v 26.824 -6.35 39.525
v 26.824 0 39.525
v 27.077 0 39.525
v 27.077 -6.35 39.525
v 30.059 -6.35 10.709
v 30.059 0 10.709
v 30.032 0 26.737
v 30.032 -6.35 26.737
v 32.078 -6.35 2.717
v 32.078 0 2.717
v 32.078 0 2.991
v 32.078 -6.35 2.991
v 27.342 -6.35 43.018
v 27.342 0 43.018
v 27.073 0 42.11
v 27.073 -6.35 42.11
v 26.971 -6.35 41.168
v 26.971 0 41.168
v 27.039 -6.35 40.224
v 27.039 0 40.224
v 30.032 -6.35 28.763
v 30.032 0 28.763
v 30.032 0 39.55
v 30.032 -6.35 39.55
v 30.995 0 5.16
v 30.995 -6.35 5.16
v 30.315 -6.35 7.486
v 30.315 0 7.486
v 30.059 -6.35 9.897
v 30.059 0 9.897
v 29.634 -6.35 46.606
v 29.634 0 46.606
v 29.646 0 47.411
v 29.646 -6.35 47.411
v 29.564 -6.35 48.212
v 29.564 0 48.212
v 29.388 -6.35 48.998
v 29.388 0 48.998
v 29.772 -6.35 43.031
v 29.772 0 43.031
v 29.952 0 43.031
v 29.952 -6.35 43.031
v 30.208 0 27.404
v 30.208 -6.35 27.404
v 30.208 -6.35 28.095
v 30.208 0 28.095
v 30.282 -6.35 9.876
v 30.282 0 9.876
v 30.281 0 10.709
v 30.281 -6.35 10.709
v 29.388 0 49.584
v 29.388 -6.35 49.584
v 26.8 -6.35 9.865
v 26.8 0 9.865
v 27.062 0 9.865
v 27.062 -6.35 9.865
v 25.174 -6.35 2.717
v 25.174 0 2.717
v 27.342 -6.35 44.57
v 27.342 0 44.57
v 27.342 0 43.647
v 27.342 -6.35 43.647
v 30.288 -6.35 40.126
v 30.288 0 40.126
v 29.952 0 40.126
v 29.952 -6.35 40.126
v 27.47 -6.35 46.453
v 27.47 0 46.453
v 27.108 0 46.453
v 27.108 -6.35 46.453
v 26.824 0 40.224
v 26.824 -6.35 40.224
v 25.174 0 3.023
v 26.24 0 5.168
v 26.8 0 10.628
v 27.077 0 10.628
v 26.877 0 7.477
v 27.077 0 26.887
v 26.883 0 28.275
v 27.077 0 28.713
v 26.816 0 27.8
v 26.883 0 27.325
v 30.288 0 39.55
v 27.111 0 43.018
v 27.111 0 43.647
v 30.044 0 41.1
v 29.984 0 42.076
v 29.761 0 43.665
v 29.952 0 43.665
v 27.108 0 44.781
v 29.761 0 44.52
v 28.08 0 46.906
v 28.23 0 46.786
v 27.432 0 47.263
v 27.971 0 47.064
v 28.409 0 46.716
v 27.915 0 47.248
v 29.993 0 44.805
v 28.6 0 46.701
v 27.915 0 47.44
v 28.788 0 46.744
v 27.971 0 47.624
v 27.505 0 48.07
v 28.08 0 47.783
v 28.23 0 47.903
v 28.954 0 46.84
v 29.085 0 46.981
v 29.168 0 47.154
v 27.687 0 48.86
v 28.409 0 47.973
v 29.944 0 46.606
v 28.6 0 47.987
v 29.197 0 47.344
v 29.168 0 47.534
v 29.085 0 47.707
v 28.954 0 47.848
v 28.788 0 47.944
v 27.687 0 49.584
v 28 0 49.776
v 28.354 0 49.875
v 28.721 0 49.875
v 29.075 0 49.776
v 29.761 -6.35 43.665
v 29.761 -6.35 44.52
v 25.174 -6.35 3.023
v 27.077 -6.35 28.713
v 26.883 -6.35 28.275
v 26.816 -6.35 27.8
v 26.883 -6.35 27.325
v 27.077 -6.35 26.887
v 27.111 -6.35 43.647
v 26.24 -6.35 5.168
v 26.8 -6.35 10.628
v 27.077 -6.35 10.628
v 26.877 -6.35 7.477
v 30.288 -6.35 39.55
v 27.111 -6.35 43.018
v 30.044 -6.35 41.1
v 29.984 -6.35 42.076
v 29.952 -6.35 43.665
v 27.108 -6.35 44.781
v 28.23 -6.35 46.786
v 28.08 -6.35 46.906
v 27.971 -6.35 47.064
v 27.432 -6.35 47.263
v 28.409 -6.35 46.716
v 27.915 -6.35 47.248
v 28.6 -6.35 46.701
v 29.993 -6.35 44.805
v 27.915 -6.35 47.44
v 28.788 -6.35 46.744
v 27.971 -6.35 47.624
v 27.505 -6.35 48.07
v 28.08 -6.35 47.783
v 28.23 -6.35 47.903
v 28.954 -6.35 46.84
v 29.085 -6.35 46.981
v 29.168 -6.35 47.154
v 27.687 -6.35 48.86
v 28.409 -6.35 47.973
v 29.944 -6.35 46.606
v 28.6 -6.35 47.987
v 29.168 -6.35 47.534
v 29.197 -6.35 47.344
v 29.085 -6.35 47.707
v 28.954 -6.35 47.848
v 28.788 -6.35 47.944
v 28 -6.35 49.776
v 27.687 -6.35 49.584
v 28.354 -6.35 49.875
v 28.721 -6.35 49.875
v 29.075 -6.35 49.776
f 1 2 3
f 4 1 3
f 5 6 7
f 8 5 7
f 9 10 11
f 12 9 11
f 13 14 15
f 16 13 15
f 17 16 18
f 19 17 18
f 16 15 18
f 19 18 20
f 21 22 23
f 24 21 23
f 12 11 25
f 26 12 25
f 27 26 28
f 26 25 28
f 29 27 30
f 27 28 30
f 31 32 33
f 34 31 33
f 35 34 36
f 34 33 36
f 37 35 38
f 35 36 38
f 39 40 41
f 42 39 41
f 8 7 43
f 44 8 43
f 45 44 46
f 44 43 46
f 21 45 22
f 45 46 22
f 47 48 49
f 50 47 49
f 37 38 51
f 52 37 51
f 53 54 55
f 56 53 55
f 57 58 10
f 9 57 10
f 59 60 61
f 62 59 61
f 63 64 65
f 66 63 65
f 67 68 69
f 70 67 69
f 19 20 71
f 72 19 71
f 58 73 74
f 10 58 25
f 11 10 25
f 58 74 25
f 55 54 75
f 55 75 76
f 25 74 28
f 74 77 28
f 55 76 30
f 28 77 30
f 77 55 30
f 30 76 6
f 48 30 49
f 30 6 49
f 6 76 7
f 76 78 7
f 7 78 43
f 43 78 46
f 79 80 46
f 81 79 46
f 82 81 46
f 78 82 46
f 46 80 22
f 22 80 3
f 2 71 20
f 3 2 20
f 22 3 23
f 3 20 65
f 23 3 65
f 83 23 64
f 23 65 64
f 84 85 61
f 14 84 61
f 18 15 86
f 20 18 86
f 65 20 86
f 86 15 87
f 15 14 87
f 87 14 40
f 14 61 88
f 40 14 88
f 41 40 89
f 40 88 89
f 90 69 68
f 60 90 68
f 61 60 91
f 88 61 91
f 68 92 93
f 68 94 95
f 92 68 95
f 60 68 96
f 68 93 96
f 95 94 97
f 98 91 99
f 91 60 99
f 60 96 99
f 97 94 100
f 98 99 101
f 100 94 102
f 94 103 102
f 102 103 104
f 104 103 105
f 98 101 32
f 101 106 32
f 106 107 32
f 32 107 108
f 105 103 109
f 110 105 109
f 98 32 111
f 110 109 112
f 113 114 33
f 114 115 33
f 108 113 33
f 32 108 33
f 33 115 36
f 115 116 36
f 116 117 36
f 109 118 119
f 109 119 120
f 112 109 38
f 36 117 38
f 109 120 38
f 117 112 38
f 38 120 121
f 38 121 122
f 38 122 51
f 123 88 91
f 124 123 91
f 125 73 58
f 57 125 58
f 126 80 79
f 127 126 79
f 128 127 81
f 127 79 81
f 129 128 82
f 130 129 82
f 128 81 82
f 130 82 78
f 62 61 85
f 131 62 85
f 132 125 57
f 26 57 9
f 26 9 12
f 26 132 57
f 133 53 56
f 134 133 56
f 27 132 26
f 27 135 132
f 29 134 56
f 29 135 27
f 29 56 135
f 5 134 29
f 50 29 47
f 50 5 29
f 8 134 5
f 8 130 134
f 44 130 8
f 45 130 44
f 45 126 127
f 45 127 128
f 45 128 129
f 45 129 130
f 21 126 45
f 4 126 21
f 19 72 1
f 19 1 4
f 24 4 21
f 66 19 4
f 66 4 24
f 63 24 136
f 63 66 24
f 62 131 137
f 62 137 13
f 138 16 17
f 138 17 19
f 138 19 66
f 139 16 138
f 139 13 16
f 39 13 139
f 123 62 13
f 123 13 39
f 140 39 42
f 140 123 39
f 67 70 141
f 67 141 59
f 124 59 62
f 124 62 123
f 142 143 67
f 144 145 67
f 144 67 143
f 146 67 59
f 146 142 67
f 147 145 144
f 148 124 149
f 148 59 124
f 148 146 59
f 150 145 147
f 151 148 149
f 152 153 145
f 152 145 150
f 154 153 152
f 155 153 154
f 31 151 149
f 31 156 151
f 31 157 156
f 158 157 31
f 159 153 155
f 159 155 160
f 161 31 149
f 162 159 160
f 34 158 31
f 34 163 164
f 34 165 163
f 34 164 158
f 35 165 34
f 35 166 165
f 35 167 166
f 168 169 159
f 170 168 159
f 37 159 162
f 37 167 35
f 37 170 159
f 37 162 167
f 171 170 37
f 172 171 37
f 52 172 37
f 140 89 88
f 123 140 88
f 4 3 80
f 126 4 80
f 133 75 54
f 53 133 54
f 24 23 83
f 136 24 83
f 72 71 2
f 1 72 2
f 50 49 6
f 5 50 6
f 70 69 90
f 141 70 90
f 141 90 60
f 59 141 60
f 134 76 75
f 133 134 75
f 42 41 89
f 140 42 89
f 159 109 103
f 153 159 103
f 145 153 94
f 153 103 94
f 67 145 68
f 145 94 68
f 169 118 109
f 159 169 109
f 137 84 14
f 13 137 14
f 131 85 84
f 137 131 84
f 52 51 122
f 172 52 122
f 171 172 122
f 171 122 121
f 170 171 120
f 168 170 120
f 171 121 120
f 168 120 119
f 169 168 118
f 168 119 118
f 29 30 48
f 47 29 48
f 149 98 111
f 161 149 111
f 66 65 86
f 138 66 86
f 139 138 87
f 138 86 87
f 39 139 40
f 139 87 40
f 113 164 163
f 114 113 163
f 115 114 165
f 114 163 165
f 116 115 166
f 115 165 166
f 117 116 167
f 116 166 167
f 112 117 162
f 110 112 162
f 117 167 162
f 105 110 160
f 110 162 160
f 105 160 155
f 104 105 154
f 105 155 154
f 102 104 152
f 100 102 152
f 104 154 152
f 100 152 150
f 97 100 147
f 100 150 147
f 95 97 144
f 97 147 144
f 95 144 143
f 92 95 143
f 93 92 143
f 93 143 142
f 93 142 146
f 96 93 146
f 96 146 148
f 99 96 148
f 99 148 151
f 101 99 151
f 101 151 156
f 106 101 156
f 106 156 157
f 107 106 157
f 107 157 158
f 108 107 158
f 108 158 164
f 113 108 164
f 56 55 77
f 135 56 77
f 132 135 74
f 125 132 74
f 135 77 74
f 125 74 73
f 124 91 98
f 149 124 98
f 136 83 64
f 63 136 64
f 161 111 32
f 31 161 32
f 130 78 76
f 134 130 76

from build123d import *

# Parameters (mm, degrees)
F1_DEPTH = 6.35
F2_R     = 0.644758
F3_DEPTH = 25.4


with BuildPart() as f1:
    # F0 (on Front) → F1 (new body)
    with BuildSketch(Plane.XZ):
        with BuildLine():
            Line((25.17445, 3.023418), (25.17445, 2.716777))
            Line((25.17445, 2.716777), (32.078393, 2.716777))
            Line((32.078393, 2.716777), (32.078393, 2.990841))
            ThreePointArc((32.078393, 2.990841), (30.603017, 6.307852), (30.058628, 9.897131))
            Line((30.058628, 9.897131), (30.28239, 9.87622))
            Line((30.28239, 9.87622), (30.281023, 10.708957))
            Line((30.281023, 10.708957), (30.058628, 10.708592))
            Line((30.058628, 10.708592), (30.032312, 26.736625))
            ThreePointArc((30.032312, 26.736625), (30.230598, 27.749797), (30.032312, 28.76297))
            Line((30.032312, 28.76297), (30.032312, 39.550062))
            Line((30.032312, 39.550062), (30.288203, 39.550062))
            Line((30.288203, 39.550062), (30.288203, 40.125817))
            Line((30.288203, 40.125817), (29.952377, 40.125817))
            ThreePointArc((29.952377, 40.125817), (30.032838, 41.588816), (29.772134, 43.030646))
            Line((29.772134, 43.030646), (29.952377, 43.030646))
            Line((29.952377, 43.030646), (29.952377, 43.664742))
            Line((29.952377, 43.664742), (29.76134, 43.664742))
            Line((29.76134, 43.664742), (29.76134, 44.51992))
            Line((29.76134, 44.51992), (29.992513, 44.805486))
            Line((29.992513, 44.805486), (29.944122, 46.605572))
            Line((29.944122, 46.605572), (29.634174, 46.605572))
            ThreePointArc((29.634174, 46.605572), (29.616481, 47.812826), (29.387884, 48.998371))
            Line((29.387884, 48.998371), (29.387884, 49.584199))
            ThreePointArc((29.387884, 49.584199), (28.53754, 49.887952), (27.687196, 49.584199))
            Line((27.687196, 49.584199), (27.687196, 48.860144))
            ThreePointArc((27.687196, 48.860144), (27.454964, 47.667764), (27.470311, 46.453077))
            Line((27.470311, 46.453077), (27.107688, 46.453077))
            Line((27.107688, 46.453077), (27.107688, 44.781074))
            Line((27.107688, 44.781074), (27.341686, 44.570461))
            Line((27.341686, 44.570461), (27.341686, 43.647271))
            Line((27.341686, 43.647271), (27.11089, 43.647271))
            Line((27.11089, 43.647271), (27.11089, 43.017823))
            Line((27.11089, 43.017823), (27.341686, 43.017823))
            ThreePointArc((27.341686, 43.017823), (27.001183, 41.641173), (27.039019, 40.223543))
            Line((27.039019, 40.223543), (26.824152, 40.223543))
            Line((26.824152, 40.223543), (26.824152, 39.525226))
            Line((26.824152, 39.525226), (27.076719, 39.525226))
            Line((27.076719, 39.525226), (27.076719, 28.713278))
            ThreePointArc((27.076719, 28.713278), (26.816318, 27.800124), (27.076719, 26.88697))
            Line((27.076719, 26.88697), (27.076719, 17.01922))
            Line((27.076719, 17.01922), (27.076719, 10.628499))
            Line((27.076719, 10.628499), (26.79955, 10.628499))
            Line((26.79955, 10.628499), (26.79955, 9.864554))
            Line((26.79955, 9.864554), (27.061559, 9.864554))
            ThreePointArc((27.061559, 9.864554), (26.613776, 6.307229), (25.17445, 3.023418))
        make_face()
    extrude(amount=F1_DEPTH)

    # F2 (on face) → F3 (cut)
    with BuildSketch(Plane.XZ.offset(6.35)):
        with Locations((28.552243, 47.344215)):
            Circle(F2_R)
    extrude(amount=-F3_DEPTH, mode=Mode.SUBTRACT)


solid = f1.part
